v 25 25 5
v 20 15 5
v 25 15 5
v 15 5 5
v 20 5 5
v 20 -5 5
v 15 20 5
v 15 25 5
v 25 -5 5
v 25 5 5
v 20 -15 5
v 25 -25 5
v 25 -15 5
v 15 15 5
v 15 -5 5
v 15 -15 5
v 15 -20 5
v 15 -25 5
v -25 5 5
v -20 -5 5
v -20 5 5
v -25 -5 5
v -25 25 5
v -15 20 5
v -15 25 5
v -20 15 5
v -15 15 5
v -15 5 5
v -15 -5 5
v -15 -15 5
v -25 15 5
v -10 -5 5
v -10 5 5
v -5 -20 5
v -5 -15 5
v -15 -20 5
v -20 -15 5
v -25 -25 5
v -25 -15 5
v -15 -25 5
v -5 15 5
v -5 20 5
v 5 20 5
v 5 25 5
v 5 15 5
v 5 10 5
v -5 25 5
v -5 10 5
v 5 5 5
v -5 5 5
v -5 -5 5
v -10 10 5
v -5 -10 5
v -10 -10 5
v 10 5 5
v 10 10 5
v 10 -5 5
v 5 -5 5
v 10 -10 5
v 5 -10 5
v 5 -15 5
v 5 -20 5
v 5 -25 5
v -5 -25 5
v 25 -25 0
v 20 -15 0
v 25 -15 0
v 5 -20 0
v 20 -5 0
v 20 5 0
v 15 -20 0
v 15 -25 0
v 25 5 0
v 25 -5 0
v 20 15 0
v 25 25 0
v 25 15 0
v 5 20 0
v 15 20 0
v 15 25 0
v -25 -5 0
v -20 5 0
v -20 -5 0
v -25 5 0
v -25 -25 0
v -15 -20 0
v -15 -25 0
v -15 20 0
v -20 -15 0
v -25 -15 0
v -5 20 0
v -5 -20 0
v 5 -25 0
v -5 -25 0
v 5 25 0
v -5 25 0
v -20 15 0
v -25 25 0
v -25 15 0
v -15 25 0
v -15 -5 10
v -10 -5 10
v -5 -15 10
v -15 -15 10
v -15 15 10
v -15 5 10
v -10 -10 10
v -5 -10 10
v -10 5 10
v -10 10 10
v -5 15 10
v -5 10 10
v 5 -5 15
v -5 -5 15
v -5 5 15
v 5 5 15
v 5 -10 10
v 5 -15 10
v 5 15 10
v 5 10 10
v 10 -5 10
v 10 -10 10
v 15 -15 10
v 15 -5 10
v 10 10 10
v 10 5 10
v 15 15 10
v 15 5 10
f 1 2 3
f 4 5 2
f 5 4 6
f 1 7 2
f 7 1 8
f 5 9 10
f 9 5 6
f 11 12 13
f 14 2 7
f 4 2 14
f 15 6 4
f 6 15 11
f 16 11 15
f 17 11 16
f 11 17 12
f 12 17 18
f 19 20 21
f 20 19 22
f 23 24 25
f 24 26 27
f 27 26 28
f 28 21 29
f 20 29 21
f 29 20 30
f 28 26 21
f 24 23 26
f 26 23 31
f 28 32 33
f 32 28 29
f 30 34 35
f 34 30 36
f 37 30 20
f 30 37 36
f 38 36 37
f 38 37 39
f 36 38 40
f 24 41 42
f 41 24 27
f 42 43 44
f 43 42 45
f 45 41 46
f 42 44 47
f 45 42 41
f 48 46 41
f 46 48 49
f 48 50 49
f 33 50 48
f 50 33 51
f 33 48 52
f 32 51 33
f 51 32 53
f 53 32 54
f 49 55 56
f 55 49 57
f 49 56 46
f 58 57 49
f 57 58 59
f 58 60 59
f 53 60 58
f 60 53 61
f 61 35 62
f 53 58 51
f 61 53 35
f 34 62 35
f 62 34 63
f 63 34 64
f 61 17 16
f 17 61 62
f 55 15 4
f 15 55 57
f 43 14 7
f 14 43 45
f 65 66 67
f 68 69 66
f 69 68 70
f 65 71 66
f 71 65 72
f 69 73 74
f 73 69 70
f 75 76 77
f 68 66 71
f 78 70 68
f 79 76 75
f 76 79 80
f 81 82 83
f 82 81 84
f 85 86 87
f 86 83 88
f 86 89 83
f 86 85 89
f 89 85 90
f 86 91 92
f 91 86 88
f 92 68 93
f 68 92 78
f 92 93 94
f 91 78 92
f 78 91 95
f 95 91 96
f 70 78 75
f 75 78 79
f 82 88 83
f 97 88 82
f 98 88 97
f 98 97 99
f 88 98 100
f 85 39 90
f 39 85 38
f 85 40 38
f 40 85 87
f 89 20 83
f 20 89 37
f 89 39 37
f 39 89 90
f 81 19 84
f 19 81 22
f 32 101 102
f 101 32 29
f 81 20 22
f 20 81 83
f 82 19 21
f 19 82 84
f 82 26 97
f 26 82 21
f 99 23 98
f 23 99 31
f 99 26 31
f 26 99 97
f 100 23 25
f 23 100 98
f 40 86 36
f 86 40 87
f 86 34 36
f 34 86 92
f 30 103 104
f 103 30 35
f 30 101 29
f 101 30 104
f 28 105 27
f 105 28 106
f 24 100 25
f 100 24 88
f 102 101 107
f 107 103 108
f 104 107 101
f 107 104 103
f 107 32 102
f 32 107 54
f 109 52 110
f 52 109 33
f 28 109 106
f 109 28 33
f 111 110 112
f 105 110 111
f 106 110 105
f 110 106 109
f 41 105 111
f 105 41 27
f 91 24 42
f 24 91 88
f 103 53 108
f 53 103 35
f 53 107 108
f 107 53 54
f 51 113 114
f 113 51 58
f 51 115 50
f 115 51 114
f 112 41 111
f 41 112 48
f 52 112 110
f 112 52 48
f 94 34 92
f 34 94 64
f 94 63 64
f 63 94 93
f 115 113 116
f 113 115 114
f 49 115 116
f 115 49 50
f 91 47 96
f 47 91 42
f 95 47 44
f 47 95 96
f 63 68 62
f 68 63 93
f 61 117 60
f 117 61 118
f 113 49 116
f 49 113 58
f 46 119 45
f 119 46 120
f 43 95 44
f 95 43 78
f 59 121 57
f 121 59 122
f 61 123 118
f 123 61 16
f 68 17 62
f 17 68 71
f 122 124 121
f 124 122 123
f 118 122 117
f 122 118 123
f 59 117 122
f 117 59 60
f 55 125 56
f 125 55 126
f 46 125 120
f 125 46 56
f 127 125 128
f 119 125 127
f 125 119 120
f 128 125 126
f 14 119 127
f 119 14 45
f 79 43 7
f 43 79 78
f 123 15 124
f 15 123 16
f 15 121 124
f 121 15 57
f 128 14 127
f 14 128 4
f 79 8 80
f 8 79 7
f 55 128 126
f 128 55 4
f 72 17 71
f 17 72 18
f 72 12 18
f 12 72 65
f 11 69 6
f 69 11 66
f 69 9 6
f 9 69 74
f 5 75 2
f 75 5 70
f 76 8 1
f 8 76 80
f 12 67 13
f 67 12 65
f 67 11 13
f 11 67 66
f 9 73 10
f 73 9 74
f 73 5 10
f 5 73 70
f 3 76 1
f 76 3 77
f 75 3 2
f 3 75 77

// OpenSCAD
/*
Height Map Example
Tony Buser <tbuser@gmail.com>
http://tonybuser.com
http://creativecommons.org/licenses/by/3.0/

Can also dynamically run this by passing an array on the command line:

/Applications/OpenSCAD.app/Contents/MacOS/OpenSCAD -m make -D bitmap=[2,2,2,0,1,3,2,2,2] -D row_size=3 -s height_map.stl height_map.scad
*/

use <bitmap.scad>

block_size = 5;
height = 5;

row_size = 10; // 10x10 pixels
bitmap = [
	1,1,0,0,1,1,0,0,1,1,
	1,1,1,1,1,1,1,1,1,1,
	0,1,2,2,1,1,2,2,1,0,
	0,1,2,1,1,1,1,2,1,0,
	1,1,1,1,3,3,1,1,1,1,
	1,1,1,1,3,3,1,1,1,1,
	0,1,2,1,1,1,1,2,1,0,
	0,1,2,2,1,1,2,2,1,0,
	1,1,1,1,1,1,1,1,1,1,
	1,1,0,0,1,1,0,0,1,1
];

bitmap(bitmap, block_size, height, row_size);
